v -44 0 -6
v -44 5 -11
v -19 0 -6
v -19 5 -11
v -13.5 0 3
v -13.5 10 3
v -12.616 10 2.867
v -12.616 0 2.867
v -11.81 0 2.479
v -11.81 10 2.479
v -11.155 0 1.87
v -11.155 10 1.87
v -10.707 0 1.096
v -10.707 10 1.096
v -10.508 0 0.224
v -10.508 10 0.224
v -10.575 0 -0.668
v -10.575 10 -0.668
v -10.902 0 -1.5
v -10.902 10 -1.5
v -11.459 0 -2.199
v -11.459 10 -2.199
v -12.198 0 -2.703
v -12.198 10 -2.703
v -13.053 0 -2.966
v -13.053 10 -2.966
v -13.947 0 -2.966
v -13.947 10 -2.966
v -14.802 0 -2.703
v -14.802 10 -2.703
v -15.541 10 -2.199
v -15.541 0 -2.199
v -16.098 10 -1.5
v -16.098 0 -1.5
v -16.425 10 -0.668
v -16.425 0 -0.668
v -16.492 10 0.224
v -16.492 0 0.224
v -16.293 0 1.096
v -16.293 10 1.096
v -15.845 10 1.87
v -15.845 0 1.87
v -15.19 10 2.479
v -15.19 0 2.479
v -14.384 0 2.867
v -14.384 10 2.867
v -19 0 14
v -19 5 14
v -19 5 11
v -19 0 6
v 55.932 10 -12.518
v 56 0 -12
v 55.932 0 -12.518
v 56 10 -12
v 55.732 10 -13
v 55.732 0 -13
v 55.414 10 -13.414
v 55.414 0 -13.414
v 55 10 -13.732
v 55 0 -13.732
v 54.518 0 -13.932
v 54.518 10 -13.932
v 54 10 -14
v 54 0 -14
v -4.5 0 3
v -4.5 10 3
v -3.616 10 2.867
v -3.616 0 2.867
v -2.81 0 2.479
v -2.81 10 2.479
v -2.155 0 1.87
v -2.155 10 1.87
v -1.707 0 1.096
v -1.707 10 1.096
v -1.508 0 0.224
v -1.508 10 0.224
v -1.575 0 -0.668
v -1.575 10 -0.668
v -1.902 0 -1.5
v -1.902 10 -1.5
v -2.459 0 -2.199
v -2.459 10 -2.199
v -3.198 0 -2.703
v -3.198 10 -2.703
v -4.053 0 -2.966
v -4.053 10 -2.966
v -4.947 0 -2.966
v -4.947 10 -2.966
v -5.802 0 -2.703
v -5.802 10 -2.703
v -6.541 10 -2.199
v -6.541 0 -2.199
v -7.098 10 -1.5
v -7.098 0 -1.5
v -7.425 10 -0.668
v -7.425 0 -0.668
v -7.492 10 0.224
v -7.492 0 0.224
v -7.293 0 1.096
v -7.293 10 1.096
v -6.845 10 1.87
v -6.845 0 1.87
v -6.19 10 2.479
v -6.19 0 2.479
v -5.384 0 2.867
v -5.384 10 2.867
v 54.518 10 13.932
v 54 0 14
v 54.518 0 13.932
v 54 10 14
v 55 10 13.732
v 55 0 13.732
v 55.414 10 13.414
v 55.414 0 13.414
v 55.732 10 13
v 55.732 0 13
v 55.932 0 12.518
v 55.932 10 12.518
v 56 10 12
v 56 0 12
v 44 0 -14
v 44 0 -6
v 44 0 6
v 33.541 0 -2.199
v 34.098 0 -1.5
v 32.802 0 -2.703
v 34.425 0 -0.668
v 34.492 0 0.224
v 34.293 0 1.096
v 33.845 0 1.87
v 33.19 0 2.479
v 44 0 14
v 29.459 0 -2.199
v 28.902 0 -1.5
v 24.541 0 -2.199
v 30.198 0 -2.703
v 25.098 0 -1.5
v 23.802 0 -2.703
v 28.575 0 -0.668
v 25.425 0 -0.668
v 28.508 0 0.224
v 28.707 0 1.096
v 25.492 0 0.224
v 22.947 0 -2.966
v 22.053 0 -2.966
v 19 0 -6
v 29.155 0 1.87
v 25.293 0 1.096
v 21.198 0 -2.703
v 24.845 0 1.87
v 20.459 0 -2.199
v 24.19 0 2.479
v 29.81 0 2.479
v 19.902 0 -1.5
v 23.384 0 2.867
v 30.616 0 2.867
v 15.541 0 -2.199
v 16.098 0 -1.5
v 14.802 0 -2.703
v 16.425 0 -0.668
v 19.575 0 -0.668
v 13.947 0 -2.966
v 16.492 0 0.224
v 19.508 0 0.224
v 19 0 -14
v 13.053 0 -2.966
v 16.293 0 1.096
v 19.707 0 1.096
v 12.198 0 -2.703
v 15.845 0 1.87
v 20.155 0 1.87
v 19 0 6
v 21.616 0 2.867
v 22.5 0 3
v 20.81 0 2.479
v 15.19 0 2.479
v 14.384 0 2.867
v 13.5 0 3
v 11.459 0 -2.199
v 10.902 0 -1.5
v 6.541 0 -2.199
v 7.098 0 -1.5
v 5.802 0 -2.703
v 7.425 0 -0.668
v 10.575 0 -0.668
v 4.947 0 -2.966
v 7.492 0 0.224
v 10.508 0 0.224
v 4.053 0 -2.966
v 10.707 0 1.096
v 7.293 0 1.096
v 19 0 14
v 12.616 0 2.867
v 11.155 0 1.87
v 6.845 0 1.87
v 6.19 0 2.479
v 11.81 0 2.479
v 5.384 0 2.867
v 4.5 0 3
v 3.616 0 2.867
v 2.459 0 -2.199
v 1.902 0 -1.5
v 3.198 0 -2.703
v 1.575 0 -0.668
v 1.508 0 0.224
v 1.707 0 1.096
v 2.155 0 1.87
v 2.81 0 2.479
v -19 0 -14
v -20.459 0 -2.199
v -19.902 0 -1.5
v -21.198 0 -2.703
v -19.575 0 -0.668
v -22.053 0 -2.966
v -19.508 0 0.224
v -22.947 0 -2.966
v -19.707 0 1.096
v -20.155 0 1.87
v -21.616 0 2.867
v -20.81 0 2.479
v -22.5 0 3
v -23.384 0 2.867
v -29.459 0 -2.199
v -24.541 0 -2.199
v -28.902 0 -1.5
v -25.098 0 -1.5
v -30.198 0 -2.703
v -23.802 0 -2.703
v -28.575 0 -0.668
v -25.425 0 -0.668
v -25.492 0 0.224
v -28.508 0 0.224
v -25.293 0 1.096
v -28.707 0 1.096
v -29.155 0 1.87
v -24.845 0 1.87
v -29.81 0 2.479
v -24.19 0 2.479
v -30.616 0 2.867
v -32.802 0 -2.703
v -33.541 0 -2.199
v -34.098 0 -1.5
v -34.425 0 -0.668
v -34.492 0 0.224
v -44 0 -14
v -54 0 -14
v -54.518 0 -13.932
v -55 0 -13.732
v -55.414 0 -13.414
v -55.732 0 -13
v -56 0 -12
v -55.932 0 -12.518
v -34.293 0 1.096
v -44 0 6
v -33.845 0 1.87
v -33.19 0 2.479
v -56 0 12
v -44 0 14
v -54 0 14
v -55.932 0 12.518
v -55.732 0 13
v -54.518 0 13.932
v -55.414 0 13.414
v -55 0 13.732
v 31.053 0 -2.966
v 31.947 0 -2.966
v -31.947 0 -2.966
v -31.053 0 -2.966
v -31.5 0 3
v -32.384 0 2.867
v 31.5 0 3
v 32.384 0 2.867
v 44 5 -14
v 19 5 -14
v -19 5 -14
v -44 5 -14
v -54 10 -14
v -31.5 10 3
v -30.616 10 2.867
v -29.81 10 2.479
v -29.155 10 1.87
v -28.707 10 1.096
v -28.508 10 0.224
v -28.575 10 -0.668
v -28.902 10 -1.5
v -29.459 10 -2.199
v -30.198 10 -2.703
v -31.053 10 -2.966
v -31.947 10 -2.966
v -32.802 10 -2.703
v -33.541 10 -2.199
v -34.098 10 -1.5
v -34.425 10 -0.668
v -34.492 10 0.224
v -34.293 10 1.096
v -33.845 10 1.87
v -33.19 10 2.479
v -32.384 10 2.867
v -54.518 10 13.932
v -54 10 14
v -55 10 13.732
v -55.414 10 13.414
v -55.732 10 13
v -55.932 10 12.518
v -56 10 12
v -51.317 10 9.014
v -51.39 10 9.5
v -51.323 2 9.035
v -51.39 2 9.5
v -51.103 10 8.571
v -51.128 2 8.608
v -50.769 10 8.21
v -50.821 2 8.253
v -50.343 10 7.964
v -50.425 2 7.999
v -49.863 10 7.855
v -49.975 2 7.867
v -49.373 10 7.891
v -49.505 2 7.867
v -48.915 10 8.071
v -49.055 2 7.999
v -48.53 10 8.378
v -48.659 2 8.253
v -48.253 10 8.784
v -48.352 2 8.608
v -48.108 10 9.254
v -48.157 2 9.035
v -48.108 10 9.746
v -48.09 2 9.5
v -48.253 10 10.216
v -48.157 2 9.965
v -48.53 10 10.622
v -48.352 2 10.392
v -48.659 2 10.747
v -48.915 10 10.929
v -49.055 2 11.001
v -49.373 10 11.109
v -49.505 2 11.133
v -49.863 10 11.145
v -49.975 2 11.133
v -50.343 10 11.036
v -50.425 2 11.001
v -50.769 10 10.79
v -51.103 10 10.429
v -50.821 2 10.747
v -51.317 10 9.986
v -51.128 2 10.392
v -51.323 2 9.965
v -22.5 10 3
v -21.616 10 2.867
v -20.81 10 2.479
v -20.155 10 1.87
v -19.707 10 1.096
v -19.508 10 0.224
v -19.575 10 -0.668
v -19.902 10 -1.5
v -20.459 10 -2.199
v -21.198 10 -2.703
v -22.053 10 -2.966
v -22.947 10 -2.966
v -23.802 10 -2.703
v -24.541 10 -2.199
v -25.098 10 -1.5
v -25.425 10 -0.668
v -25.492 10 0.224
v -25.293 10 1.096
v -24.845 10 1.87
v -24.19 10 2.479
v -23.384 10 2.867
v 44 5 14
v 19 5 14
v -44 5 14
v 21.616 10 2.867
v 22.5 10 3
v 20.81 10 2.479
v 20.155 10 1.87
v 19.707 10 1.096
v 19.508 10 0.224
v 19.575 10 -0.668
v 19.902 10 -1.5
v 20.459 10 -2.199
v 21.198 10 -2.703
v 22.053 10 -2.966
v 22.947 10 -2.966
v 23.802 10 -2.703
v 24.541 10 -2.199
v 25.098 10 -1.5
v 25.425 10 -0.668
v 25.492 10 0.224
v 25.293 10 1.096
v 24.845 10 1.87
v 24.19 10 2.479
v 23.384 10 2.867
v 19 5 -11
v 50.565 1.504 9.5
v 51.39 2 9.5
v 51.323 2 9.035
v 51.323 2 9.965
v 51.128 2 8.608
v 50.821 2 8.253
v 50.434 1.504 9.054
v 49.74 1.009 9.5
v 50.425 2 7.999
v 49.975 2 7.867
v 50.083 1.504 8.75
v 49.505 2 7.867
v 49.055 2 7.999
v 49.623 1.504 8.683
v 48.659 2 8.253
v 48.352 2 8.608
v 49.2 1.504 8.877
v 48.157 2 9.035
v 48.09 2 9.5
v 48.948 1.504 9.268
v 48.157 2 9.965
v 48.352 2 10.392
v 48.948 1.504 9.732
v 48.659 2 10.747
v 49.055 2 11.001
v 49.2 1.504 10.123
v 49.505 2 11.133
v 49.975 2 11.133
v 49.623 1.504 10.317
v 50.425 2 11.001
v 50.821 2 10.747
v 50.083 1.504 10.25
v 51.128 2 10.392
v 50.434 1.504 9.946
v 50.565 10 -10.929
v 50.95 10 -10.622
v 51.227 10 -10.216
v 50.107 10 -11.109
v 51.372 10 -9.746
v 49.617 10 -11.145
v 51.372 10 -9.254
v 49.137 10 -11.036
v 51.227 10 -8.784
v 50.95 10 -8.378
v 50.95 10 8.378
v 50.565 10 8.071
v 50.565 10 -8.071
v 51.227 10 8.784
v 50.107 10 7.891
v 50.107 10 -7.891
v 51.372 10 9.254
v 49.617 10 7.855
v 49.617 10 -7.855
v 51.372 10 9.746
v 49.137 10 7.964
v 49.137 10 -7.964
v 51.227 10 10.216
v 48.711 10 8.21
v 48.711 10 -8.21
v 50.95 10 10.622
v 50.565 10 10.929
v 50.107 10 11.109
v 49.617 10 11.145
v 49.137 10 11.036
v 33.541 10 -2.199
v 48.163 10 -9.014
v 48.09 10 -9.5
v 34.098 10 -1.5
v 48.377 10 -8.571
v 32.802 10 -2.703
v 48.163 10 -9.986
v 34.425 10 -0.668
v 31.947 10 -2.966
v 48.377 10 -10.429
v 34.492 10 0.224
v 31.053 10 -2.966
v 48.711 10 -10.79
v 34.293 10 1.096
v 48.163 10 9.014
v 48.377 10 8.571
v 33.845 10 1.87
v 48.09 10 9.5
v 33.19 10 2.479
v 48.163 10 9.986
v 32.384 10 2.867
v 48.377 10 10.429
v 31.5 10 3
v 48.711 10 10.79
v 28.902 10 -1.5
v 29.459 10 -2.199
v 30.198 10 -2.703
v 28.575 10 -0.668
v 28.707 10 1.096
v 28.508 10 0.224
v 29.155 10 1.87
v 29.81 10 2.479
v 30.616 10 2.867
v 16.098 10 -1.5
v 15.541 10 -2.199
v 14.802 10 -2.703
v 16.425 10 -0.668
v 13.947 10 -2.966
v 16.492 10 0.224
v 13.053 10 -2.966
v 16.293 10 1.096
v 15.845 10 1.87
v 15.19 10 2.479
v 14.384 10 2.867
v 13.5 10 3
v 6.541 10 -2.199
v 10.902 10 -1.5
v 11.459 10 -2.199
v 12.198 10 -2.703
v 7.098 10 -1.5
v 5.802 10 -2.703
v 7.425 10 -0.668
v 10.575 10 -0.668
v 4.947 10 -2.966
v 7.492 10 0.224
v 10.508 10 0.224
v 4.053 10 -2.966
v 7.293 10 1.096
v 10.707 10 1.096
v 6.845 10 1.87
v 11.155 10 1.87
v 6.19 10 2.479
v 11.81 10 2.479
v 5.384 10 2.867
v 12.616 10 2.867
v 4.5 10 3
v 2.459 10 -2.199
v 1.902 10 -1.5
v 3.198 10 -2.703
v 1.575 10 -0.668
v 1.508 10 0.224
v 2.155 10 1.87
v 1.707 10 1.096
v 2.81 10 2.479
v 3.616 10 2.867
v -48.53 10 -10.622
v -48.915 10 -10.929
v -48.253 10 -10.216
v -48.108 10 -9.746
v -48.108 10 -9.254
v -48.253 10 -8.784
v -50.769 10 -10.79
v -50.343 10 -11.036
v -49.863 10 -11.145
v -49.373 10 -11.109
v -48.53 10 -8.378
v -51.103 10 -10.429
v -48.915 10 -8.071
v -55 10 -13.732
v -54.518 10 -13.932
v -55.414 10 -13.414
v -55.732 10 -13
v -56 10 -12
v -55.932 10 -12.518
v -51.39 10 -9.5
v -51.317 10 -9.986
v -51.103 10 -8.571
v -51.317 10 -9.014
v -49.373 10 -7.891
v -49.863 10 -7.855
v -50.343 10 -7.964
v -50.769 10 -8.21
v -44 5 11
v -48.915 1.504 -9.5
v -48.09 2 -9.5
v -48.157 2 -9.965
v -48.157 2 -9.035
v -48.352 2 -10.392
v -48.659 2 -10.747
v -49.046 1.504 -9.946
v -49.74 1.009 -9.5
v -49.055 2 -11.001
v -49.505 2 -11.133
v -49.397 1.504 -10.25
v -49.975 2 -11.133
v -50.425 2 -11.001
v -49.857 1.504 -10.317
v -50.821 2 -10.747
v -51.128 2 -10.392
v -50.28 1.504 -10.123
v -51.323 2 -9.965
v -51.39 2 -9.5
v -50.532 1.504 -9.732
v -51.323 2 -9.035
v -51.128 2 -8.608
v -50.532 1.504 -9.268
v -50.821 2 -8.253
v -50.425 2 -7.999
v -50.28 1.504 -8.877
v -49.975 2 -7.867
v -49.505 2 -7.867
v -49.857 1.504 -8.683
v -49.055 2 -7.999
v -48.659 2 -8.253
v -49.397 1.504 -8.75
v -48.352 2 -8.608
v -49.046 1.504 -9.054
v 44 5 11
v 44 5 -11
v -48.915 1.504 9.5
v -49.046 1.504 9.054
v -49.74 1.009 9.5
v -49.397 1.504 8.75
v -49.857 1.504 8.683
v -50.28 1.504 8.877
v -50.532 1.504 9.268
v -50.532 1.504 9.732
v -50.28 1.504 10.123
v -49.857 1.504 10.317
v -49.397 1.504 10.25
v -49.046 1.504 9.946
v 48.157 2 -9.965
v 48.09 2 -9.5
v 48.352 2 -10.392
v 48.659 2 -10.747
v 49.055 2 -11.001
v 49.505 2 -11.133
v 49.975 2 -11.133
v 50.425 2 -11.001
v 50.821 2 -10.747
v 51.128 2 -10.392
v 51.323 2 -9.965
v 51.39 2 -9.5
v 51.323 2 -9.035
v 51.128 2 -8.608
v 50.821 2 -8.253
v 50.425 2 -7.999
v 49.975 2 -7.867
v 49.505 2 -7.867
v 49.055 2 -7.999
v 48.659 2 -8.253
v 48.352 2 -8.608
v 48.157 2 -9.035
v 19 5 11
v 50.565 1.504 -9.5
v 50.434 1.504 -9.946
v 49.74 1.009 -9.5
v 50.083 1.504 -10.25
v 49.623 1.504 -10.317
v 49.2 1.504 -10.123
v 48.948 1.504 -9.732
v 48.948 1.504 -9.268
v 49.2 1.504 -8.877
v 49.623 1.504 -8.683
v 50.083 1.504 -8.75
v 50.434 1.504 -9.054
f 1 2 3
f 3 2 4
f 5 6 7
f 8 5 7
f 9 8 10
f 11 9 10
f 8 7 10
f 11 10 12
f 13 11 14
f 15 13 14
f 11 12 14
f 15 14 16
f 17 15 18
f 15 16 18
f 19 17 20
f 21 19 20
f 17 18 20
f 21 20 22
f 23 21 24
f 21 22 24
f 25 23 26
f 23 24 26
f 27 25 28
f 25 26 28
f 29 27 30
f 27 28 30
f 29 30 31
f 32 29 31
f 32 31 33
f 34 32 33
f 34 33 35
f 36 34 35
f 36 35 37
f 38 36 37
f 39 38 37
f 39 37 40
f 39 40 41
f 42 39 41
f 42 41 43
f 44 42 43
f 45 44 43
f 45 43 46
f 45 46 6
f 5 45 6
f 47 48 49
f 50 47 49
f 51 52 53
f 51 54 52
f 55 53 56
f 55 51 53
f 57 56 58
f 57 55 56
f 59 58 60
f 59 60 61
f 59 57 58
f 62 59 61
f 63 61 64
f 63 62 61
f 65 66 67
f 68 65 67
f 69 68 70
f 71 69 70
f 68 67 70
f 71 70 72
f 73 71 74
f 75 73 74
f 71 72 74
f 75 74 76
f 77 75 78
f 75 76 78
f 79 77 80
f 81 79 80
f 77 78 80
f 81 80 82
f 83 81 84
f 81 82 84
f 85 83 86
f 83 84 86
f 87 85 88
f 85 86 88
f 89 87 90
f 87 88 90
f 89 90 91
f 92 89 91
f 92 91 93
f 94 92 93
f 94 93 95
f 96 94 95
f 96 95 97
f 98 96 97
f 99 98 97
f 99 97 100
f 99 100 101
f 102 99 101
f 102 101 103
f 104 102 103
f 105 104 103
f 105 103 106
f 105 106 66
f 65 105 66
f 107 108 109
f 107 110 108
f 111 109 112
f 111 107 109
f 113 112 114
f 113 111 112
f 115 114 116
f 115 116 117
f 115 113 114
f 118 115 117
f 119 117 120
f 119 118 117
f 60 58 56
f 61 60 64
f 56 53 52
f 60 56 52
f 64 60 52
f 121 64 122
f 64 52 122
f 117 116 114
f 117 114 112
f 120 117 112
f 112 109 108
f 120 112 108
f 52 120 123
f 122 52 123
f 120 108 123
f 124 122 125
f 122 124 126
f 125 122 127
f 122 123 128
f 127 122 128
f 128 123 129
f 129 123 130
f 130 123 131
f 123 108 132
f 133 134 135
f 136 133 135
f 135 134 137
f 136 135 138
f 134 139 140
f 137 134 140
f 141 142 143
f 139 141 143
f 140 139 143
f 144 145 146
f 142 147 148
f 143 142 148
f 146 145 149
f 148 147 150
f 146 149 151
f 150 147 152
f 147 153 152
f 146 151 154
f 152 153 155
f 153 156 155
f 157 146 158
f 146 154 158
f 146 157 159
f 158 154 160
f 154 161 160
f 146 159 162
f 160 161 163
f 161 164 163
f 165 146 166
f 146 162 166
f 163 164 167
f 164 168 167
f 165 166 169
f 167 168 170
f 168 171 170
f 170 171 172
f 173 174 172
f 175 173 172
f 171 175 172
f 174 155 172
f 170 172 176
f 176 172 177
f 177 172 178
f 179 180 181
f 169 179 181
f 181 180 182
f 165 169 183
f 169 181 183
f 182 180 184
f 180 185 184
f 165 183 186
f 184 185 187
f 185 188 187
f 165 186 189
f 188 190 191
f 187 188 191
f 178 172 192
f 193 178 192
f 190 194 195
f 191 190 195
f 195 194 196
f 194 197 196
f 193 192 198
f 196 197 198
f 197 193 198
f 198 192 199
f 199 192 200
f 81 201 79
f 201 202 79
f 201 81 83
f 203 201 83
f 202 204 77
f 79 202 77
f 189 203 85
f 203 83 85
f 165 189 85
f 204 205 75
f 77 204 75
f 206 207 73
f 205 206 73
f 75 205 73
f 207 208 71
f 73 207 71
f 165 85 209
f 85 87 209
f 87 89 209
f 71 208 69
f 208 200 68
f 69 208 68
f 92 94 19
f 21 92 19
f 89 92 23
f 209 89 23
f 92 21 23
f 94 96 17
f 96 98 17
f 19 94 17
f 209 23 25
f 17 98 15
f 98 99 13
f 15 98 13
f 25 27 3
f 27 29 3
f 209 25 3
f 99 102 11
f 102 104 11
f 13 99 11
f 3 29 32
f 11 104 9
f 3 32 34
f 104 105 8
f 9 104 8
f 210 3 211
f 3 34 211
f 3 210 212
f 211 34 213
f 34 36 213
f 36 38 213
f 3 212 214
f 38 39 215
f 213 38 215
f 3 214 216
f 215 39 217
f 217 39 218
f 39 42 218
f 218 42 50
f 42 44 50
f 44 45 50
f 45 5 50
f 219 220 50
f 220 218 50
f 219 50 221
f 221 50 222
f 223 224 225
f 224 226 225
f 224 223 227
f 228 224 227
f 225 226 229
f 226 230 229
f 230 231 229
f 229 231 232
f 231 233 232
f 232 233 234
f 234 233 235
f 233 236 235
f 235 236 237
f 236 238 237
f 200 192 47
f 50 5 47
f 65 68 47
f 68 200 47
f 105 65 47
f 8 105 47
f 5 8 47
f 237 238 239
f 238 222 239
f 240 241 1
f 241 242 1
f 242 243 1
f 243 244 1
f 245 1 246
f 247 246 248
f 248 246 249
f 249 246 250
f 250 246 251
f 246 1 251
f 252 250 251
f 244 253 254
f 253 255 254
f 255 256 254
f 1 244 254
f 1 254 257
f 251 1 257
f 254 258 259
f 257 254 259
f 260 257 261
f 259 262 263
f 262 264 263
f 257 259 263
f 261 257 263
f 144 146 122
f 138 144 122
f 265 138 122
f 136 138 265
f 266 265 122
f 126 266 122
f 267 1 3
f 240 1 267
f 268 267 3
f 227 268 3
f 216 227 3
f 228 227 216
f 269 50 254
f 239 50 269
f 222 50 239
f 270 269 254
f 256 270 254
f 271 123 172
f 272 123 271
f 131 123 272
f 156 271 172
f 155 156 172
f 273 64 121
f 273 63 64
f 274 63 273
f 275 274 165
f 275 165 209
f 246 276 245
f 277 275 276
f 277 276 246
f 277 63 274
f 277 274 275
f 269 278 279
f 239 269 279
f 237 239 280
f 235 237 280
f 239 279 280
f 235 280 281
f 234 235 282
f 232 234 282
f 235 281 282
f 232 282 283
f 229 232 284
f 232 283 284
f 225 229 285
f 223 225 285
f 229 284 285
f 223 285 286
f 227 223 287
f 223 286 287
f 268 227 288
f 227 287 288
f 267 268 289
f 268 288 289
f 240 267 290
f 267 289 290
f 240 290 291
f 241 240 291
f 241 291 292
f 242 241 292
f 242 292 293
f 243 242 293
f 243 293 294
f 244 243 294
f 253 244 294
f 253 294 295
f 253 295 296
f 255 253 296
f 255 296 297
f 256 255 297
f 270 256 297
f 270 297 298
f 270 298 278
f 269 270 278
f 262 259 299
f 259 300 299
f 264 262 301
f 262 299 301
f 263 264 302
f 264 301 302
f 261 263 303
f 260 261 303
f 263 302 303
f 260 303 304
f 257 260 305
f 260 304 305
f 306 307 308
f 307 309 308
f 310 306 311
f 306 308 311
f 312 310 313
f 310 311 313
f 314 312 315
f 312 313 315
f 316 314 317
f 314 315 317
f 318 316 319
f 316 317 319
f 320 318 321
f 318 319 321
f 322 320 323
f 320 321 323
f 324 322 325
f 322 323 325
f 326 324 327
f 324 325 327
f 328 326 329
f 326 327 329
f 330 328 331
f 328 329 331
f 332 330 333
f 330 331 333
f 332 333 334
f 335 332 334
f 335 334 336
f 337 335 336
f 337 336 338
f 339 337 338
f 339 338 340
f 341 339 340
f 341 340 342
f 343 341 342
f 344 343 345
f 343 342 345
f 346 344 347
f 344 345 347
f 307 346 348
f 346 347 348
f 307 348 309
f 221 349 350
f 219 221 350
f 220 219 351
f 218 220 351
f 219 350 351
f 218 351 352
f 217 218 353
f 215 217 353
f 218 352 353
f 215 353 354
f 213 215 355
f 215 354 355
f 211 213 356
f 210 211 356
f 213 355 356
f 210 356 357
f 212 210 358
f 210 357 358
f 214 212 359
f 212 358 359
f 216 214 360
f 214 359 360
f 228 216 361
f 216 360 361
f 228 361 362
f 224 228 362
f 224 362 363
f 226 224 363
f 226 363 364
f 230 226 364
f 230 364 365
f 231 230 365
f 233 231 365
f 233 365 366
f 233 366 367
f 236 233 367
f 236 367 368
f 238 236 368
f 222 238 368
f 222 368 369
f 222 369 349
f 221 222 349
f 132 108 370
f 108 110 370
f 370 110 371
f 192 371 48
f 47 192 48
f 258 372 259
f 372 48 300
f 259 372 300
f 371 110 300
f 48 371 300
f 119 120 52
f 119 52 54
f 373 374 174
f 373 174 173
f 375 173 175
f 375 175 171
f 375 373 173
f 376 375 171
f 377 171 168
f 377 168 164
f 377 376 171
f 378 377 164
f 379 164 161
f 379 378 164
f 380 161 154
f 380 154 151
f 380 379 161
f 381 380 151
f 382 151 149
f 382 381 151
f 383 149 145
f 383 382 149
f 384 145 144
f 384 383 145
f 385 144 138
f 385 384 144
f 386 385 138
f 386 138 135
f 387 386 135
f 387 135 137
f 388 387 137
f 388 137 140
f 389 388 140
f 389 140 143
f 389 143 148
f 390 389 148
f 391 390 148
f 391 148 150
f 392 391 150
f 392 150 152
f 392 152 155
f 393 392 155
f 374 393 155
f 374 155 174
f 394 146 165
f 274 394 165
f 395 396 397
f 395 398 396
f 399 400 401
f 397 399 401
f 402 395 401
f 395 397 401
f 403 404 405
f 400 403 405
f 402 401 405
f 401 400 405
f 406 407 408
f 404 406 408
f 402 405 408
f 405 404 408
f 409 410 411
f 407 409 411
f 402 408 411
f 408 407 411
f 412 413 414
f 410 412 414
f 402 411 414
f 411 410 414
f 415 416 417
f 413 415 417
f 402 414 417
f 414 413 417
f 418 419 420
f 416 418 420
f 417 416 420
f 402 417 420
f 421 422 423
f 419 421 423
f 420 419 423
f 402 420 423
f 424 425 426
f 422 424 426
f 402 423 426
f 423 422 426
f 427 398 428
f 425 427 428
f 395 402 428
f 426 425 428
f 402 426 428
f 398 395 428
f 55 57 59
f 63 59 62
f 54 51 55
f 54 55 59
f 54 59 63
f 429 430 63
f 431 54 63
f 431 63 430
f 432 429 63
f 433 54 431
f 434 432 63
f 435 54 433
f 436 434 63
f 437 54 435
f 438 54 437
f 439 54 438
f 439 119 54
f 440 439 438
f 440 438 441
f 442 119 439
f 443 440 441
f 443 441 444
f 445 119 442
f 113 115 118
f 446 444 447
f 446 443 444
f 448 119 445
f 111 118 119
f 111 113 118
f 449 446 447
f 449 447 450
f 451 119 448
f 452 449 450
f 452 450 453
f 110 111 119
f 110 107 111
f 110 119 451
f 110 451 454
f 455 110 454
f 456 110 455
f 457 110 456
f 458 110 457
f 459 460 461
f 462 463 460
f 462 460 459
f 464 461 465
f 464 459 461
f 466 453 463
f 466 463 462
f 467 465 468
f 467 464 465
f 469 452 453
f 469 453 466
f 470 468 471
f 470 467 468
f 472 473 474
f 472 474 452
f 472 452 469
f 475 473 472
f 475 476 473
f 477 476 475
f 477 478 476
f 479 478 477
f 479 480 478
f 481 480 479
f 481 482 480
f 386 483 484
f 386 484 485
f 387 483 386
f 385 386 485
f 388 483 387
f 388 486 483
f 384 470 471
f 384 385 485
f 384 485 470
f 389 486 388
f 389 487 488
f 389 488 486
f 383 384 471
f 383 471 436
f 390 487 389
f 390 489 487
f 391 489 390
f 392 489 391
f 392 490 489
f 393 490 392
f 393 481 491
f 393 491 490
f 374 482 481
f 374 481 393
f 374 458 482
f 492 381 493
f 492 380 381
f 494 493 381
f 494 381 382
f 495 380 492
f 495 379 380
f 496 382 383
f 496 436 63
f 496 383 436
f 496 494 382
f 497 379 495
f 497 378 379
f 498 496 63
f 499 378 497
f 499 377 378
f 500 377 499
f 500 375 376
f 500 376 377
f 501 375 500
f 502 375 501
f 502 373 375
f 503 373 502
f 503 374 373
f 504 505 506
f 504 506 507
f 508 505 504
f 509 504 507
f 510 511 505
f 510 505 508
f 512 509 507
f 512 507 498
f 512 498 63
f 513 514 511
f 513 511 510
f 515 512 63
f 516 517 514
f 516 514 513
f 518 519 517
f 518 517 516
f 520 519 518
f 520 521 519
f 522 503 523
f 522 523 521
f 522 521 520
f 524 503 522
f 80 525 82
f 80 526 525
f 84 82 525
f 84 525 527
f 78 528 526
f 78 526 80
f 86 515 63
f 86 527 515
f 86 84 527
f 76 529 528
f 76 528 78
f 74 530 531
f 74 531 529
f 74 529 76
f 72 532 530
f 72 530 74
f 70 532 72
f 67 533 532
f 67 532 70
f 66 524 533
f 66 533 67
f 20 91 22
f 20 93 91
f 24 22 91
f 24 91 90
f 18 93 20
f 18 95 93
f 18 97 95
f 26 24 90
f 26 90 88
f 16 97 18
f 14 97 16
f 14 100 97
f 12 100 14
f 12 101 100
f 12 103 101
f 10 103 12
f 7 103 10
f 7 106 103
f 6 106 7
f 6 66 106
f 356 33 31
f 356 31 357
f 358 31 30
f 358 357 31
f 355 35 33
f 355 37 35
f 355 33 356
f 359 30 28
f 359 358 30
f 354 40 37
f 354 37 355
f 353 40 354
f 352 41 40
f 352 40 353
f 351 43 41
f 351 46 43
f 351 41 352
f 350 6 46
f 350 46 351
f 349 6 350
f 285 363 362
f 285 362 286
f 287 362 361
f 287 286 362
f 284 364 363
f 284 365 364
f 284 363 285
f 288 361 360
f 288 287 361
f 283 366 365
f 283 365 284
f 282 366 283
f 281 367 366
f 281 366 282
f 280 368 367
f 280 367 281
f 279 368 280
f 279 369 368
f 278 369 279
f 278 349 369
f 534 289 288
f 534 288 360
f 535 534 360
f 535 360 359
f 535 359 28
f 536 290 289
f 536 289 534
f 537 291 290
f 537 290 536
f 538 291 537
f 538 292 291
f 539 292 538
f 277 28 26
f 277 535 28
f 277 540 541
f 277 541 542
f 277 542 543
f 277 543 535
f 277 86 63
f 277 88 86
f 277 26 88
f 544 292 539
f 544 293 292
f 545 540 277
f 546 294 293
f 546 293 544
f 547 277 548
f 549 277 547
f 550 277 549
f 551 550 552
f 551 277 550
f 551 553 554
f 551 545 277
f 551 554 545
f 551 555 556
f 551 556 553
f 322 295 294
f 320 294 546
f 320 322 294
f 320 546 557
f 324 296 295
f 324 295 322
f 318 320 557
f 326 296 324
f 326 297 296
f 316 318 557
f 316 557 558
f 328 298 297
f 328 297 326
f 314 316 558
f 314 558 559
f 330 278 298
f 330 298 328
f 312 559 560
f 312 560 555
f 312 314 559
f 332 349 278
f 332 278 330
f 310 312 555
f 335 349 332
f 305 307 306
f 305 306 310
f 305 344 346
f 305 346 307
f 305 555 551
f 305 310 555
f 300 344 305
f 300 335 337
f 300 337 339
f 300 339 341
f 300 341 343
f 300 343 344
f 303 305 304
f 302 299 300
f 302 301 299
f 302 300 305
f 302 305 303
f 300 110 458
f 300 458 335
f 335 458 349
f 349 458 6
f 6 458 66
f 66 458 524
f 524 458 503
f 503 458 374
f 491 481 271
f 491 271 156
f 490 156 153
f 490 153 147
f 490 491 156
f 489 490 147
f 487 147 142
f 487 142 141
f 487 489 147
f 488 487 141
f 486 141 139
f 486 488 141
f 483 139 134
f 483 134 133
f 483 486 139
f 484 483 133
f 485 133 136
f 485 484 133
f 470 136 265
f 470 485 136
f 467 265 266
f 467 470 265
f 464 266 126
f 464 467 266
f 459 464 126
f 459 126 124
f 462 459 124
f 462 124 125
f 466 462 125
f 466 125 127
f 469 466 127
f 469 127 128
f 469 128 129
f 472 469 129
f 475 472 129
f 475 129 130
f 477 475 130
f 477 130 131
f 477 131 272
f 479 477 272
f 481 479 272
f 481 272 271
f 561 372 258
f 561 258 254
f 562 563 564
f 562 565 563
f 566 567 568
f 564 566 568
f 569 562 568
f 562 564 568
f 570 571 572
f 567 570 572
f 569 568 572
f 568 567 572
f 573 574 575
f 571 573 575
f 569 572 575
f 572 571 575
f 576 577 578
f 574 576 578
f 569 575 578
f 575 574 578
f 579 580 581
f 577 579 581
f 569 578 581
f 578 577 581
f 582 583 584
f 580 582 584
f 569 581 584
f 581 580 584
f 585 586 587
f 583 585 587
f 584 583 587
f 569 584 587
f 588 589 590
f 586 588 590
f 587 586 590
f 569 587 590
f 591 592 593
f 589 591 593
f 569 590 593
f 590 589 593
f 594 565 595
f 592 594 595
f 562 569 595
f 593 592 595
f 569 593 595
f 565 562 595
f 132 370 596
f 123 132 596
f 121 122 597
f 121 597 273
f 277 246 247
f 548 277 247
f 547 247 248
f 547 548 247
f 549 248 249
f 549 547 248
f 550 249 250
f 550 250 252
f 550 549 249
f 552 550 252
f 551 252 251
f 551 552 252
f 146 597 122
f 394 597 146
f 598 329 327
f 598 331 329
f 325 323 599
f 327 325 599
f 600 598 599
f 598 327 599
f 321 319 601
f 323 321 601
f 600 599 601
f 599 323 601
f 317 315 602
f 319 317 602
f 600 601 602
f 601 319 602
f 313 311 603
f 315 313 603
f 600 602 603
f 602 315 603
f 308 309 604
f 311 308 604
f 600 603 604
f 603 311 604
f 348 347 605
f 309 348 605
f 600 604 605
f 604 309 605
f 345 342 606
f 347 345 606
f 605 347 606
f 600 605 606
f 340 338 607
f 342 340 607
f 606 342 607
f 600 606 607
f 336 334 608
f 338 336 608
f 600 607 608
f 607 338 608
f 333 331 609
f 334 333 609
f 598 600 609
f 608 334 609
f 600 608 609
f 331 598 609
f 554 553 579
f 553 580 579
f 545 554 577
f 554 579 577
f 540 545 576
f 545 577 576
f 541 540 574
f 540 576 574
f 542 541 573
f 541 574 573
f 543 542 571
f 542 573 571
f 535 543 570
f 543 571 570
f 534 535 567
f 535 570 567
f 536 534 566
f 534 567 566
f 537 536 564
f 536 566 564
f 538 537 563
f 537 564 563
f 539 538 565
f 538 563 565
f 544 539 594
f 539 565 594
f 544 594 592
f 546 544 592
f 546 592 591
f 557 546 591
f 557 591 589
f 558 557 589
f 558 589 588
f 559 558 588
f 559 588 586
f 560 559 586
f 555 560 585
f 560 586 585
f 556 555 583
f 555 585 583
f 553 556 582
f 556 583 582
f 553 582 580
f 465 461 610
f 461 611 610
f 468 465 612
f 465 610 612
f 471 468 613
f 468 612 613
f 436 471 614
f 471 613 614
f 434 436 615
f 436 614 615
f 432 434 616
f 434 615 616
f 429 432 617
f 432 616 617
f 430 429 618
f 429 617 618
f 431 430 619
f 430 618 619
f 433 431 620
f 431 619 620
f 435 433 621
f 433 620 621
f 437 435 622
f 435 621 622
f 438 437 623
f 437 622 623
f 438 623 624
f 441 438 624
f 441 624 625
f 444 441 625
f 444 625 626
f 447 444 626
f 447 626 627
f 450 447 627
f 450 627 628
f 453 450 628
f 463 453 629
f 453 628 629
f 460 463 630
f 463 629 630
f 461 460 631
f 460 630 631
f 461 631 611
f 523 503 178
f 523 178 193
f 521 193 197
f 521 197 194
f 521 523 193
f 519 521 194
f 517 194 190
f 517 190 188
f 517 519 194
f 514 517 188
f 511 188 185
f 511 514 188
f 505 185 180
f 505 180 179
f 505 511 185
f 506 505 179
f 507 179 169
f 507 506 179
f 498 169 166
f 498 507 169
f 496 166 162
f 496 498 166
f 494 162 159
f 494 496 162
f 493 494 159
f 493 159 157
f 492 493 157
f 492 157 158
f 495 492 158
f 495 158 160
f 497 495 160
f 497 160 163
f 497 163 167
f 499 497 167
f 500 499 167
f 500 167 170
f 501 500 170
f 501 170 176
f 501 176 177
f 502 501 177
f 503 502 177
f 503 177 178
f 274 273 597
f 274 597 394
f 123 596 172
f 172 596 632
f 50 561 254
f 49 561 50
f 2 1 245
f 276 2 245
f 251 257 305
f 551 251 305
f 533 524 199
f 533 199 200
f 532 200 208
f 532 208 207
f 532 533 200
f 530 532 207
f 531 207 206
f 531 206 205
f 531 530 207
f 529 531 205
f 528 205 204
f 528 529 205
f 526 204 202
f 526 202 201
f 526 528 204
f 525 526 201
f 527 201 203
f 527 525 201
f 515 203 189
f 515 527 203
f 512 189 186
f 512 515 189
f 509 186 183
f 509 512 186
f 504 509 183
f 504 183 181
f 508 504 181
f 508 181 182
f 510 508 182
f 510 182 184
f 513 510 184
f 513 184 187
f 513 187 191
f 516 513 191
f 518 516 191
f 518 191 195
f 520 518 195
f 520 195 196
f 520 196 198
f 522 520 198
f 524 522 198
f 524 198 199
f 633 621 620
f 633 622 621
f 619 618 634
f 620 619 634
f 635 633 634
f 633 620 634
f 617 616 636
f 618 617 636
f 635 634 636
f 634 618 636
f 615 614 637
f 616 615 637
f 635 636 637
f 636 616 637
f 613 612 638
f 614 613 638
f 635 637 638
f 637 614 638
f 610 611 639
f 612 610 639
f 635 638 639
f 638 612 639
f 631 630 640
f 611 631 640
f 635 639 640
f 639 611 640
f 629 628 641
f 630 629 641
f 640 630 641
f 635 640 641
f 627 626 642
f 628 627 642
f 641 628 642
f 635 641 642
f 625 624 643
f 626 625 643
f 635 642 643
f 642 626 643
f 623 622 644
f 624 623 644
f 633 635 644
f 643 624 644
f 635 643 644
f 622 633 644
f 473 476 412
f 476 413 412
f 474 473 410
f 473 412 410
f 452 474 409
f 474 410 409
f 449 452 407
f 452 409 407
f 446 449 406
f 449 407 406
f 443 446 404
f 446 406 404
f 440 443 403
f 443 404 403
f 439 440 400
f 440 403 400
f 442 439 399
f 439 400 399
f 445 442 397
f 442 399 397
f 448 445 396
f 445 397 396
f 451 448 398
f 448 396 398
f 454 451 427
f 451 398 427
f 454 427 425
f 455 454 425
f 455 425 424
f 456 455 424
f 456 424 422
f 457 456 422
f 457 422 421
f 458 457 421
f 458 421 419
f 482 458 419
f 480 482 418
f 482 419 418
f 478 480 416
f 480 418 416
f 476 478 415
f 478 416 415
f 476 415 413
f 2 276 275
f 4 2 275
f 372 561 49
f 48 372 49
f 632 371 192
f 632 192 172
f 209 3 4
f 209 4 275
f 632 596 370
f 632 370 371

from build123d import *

# Parameters (mm, degrees)
SKETCH1_W                 = 56
SKETCH1_H                 = 10
BOSS_EXTRUDE1_DEPTH       = 14
SKETCH9_W                 = 25
SKETCH9_H                 = 8
CUT_EXTRUDE2_DEPTH        = 5
CHAMFER2_SIZE             = 5
SKETCH10_R                = 3
CUT_EXTRUDE3_DEPTH        = 59.583274064
F_3_0MM_DOWEL_HOLE1_D     = 3.3
F_3_0MM_DOWEL_HOLE1_DEPTH = 8
F_3_0MM_DOWEL_HOLE1_TIP   = 0.991420021
FILLET1_R                 = 2


with BuildPart() as part:
    # Sketch1 → Boss-Extrude1 (new, symmetric)
    with BuildSketch(Plane.XY):
        with Locations((-28, 5)):
            Rectangle(SKETCH1_W, SKETCH1_H)
    extrude(amount=BOSS_EXTRUDE1_DEPTH, both=True)

    # Sketch9 → Cut-Extrude2 (cut)
    with BuildSketch(Plane(origin=(0, 0, 0), x_dir=(1, 0, 0), z_dir=(0, 1, 0))):
        with Locations((-31.5, 10)):
            Rectangle(SKETCH9_W, SKETCH9_H)
        with Locations((-31.5, -10)):
            Rectangle(SKETCH9_W, SKETCH9_H)
    extrude(amount=CUT_EXTRUDE2_DEPTH, mode=Mode.SUBTRACT)

    # Chamfer2
    chamfer2_edges = [part.edges().sort_by_distance(p)[0] for p in [
        (-31.5, 5, -6),
        (-31.5, 5, 6),
    ]]
    chamfer(chamfer2_edges, length=CHAMFER2_SIZE - 0.0001)  # a hair under: the kernel refuses the full size

    # Sketch10 → Cut-Extrude3 (cut, through all)
    with BuildSketch(Plane(origin=(0, 10, 0), x_dir=(1, 0, 0), z_dir=(0, 1, 0))):
        with Locations(Location((-4.5, 0, 0), (0, 0, 270))):
            Circle(SKETCH10_R)
        with Locations(Location((-13.5, 0, 0), (0, 0, 270))):
            Circle(SKETCH10_R)
        with Locations(Location((-22.5, 0, 0), (0, 0, 270))):
            Circle(SKETCH10_R)
        with Locations(Location((-31.5, 0, 0), (0, 0, 270))):
            Circle(SKETCH10_R)
    extrude(amount=-CUT_EXTRUDE3_DEPTH, mode=Mode.SUBTRACT)

    # Mirror1: part across plane


with BuildPart() as part_1:
    add(part.part)
    add(part.part.mirror(Plane(origin=(0, 10, 14), x_dir=(0, 0, 1), z_dir=(-1, 0, 0))))

    # Ø3.0mm Dowel Hole1
    with Locations(Plane(origin=(0, 10, 0), x_dir=(1, 0, 0), z_dir=(0, 1, 0))):
        with Locations((49.74, 9.5), (-49.74, -9.5), (-49.74, 9.5), (49.74, -9.5)):
            Hole(F_3_0MM_DOWEL_HOLE1_D / 2, depth=F_3_0MM_DOWEL_HOLE1_DEPTH)
            with Locations((0, 0, -(F_3_0MM_DOWEL_HOLE1_DEPTH + F_3_0MM_DOWEL_HOLE1_TIP / 2))):  # 118° drill point
                Cone(0, F_3_0MM_DOWEL_HOLE1_D / 2, F_3_0MM_DOWEL_HOLE1_TIP, mode=Mode.SUBTRACT)

    # Fillet1
    fillet1_edges = [part_1.edges().sort_by_distance(p)[0] for p in [
        (-56, 5, 14),
        (-56, 5, -14),
        (56, 5, -14),
        (56, 5, 14),
    ]]
    fillet(fillet1_edges, radius=FILLET1_R)


solid = part_1.part
